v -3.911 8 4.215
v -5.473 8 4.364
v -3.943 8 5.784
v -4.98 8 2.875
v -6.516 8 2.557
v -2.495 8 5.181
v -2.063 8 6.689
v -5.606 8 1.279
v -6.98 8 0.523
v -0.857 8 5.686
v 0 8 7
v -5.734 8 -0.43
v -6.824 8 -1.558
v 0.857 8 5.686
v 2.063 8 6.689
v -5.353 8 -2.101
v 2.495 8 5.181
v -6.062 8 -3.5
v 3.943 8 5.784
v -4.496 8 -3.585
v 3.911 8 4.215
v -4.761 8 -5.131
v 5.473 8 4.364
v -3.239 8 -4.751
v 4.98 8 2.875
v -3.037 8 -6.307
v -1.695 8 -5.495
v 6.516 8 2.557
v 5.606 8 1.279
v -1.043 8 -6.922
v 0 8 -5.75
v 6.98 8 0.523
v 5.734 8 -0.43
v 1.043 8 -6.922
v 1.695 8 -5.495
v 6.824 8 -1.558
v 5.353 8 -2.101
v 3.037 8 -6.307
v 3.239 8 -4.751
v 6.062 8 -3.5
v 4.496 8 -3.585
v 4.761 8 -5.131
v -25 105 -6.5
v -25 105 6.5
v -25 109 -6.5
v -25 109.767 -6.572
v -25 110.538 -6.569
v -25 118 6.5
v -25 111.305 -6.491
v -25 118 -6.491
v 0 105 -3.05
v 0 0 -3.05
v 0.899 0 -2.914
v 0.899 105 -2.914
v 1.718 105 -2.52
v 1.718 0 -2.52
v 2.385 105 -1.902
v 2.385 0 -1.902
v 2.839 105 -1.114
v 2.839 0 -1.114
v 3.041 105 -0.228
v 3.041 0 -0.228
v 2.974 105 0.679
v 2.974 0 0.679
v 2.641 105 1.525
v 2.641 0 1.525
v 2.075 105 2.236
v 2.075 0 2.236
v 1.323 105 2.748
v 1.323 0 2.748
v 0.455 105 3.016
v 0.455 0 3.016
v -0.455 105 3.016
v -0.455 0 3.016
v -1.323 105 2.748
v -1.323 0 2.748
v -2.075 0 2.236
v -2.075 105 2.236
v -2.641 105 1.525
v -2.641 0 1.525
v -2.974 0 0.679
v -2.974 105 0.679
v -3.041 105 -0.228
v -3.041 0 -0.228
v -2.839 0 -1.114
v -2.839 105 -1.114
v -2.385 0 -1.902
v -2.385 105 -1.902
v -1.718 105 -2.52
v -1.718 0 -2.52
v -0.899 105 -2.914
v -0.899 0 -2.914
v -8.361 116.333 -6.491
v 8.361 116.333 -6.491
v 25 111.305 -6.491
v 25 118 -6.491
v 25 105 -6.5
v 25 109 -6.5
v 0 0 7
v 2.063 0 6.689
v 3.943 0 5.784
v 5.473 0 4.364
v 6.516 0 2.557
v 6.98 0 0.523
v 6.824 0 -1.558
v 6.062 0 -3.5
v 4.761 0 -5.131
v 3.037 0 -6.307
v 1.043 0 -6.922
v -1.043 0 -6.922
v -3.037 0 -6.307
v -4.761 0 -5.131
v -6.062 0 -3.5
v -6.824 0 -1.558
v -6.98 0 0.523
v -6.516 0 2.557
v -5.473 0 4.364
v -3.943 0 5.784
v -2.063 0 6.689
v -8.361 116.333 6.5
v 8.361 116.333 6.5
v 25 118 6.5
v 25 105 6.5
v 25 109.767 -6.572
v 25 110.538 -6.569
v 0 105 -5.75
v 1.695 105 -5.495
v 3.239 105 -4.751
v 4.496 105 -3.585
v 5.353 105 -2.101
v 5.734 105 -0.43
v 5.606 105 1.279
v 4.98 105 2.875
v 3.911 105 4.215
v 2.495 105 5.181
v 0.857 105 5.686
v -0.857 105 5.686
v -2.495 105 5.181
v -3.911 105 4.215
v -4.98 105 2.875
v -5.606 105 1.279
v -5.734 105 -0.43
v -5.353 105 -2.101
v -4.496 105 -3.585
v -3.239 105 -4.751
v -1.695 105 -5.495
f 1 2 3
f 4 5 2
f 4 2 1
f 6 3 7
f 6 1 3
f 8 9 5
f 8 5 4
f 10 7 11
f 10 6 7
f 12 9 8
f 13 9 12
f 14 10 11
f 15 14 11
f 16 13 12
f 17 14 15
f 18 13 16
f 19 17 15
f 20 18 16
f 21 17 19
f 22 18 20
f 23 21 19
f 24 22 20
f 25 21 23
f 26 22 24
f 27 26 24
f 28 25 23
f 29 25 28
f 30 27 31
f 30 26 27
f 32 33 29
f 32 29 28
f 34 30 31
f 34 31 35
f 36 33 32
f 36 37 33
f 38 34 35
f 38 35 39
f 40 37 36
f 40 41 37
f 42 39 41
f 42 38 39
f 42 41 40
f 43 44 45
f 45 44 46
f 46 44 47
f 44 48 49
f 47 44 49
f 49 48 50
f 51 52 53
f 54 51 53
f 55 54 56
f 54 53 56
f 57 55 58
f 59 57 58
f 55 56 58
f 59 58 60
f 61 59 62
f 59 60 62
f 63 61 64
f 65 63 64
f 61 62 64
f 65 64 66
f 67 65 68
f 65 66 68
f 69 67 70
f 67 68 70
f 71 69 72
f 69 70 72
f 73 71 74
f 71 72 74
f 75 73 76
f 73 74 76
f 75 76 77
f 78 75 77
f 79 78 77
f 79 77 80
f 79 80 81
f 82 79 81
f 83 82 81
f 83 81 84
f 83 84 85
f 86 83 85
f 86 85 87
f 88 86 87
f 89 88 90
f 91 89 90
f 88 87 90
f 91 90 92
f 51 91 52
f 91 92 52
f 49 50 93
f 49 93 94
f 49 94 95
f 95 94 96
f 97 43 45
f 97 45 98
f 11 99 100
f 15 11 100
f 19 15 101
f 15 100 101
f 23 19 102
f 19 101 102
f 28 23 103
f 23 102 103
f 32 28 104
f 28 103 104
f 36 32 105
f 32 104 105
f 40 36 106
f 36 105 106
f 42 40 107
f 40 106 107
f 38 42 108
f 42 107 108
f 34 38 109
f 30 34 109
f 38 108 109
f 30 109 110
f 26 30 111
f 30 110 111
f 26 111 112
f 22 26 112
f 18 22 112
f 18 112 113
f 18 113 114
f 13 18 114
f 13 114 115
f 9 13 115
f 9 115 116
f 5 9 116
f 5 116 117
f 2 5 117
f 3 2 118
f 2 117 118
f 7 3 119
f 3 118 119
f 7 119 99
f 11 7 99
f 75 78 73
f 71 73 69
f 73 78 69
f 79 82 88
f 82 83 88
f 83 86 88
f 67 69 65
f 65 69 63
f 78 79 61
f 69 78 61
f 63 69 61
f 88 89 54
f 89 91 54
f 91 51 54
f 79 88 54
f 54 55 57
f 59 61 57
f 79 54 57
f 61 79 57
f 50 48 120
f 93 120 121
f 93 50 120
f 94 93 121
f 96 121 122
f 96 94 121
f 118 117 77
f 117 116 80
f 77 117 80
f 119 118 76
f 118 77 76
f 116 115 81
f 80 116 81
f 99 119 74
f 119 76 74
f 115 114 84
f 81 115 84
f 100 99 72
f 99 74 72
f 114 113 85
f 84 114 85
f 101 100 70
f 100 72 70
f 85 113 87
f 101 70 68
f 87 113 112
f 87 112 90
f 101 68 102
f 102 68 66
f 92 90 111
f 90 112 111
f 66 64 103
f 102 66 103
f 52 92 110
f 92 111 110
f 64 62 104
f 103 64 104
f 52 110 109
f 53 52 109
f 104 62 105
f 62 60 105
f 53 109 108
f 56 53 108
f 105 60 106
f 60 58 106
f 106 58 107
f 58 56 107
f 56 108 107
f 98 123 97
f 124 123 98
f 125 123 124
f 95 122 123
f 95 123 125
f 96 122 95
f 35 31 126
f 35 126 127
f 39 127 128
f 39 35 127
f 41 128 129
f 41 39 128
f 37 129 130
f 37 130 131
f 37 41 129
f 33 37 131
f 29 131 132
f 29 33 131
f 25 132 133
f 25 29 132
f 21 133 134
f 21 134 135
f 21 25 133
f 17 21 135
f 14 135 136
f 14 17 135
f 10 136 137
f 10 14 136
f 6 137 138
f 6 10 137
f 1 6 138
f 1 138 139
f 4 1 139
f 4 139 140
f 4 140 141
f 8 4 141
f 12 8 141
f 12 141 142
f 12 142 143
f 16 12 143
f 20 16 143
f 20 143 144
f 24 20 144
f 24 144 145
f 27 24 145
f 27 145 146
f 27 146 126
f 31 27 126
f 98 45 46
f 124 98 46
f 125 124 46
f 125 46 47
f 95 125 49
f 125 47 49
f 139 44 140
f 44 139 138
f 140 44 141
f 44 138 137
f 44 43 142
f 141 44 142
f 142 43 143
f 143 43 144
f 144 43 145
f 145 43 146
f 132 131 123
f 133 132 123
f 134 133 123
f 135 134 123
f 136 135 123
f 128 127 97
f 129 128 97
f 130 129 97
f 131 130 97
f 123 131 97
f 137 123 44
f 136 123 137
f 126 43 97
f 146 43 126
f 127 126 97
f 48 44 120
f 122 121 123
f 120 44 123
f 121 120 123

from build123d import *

# Parameters (mm, degrees)
SKETCH1_R            = 7
SKETCH1_R_2          = 4
BOSS_EXTRUDE1_DEPTH  = 8
SKETCH1_3_R          = 4.75
SKETCH1_3_R_2        = 4
BOSS_EXTRUDE2_DEPTH  = 80
SKETCH3_R            = 5.75
SKETCH3_R_2          = 3.05
BOSS_EXTRUDE3_DEPTH  = 105
SKETCH8_W            = 50
SKETCH8_H            = 13
BOSS_EXTRUDE8_DEPTH  = 4
SKETCH9_W            = 50
SKETCH9_H            = 6.245985434
BOSS_EXTRUDE9_DEPTH  = 9
BOSS_EXTRUDE10_DEPTH = 50
SKETCH11_W           = 50
SKETCH11_H           = 12.98265639
BOSS_EXTRUDE11_DEPTH = 10
CUT_EXTRUDE1_DEPTH   = 100


with BuildPart() as part:
    # Sketch1 → Boss-Extrude1 (new body)
    with BuildSketch(Plane(origin=(0, 0, 0), x_dir=(1, 0, 0), z_dir=(0, 1, 0))):
        Circle(SKETCH1_R)
        Circle(SKETCH1_R_2, mode=Mode.SUBTRACT)
    extrude(amount=BOSS_EXTRUDE1_DEPTH)

    # Sketch1<3> → Boss-Extrude2 (add)
    with BuildSketch(Plane(origin=(0, 0, 0), x_dir=(1, 0, 0), z_dir=(0, 1, 0))):
        Circle(SKETCH1_3_R)
        Circle(SKETCH1_3_R_2, mode=Mode.SUBTRACT)
    extrude(amount=BOSS_EXTRUDE2_DEPTH)

    # Sketch3 → Boss-Extrude3 (add)
    with BuildSketch(Plane.XZ):
        Circle(SKETCH3_R)
        Circle(SKETCH3_R_2, mode=Mode.SUBTRACT)
    extrude(amount=-BOSS_EXTRUDE3_DEPTH)

    # Sketch8 → Boss-Extrude8 (add)
    with BuildSketch(Plane(origin=(0, 105, 0), x_dir=(1, 0, 0), z_dir=(0, 1, 0))):
        Rectangle(SKETCH8_W, SKETCH8_H)
    extrude(amount=BOSS_EXTRUDE8_DEPTH)

    # Sketch9 → Boss-Extrude9 (add)
    with BuildSketch(Plane(origin=(0, 109, 0), x_dir=(1, 0, 0), z_dir=(0, 1, 0))):
        with Locations((0, -3.377007283)):
            Rectangle(SKETCH9_W, SKETCH9_H)
    extrude(amount=BOSS_EXTRUDE9_DEPTH)

    # Sketch10 → Boss-Extrude10 (add)
    with BuildSketch(Plane.ZY.offset(25)):
        with BuildLine():
            Line((0.254014566, 118), (0.254014566, 109))
            Line((0.254014566, 109), (-6.5, 109))
            ThreePointArc((-6.5, 109), (-4.986953748, 114.898802217), (0.254014566, 118))
        make_face()
    extrude(amount=-BOSS_EXTRUDE10_DEPTH)

    # Sketch11 → Boss-Extrude11 (add)
    with BuildSketch(Plane(origin=(0, 118, 0), x_dir=(1, 0, 0), z_dir=(0, 1, 0))):
        Rectangle(SKETCH11_W, SKETCH11_H)
    extrude(amount=-BOSS_EXTRUDE11_DEPTH)

    # Sketch12 → Cut-Extrude1 (cut)
    with BuildSketch(Plane(origin=(0, 0, -6.491328195), x_dir=(-1, 0, 0), z_dir=(0, 0, -1))):
        with BuildLine():
            Line((-25, 118), (25, 118))
            ThreePointArc((25, 118), (0, 116.124221553), (-25, 118))
        make_face()
    extrude(amount=-CUT_EXTRUDE1_DEPTH, mode=Mode.SUBTRACT)


solid = part.part
